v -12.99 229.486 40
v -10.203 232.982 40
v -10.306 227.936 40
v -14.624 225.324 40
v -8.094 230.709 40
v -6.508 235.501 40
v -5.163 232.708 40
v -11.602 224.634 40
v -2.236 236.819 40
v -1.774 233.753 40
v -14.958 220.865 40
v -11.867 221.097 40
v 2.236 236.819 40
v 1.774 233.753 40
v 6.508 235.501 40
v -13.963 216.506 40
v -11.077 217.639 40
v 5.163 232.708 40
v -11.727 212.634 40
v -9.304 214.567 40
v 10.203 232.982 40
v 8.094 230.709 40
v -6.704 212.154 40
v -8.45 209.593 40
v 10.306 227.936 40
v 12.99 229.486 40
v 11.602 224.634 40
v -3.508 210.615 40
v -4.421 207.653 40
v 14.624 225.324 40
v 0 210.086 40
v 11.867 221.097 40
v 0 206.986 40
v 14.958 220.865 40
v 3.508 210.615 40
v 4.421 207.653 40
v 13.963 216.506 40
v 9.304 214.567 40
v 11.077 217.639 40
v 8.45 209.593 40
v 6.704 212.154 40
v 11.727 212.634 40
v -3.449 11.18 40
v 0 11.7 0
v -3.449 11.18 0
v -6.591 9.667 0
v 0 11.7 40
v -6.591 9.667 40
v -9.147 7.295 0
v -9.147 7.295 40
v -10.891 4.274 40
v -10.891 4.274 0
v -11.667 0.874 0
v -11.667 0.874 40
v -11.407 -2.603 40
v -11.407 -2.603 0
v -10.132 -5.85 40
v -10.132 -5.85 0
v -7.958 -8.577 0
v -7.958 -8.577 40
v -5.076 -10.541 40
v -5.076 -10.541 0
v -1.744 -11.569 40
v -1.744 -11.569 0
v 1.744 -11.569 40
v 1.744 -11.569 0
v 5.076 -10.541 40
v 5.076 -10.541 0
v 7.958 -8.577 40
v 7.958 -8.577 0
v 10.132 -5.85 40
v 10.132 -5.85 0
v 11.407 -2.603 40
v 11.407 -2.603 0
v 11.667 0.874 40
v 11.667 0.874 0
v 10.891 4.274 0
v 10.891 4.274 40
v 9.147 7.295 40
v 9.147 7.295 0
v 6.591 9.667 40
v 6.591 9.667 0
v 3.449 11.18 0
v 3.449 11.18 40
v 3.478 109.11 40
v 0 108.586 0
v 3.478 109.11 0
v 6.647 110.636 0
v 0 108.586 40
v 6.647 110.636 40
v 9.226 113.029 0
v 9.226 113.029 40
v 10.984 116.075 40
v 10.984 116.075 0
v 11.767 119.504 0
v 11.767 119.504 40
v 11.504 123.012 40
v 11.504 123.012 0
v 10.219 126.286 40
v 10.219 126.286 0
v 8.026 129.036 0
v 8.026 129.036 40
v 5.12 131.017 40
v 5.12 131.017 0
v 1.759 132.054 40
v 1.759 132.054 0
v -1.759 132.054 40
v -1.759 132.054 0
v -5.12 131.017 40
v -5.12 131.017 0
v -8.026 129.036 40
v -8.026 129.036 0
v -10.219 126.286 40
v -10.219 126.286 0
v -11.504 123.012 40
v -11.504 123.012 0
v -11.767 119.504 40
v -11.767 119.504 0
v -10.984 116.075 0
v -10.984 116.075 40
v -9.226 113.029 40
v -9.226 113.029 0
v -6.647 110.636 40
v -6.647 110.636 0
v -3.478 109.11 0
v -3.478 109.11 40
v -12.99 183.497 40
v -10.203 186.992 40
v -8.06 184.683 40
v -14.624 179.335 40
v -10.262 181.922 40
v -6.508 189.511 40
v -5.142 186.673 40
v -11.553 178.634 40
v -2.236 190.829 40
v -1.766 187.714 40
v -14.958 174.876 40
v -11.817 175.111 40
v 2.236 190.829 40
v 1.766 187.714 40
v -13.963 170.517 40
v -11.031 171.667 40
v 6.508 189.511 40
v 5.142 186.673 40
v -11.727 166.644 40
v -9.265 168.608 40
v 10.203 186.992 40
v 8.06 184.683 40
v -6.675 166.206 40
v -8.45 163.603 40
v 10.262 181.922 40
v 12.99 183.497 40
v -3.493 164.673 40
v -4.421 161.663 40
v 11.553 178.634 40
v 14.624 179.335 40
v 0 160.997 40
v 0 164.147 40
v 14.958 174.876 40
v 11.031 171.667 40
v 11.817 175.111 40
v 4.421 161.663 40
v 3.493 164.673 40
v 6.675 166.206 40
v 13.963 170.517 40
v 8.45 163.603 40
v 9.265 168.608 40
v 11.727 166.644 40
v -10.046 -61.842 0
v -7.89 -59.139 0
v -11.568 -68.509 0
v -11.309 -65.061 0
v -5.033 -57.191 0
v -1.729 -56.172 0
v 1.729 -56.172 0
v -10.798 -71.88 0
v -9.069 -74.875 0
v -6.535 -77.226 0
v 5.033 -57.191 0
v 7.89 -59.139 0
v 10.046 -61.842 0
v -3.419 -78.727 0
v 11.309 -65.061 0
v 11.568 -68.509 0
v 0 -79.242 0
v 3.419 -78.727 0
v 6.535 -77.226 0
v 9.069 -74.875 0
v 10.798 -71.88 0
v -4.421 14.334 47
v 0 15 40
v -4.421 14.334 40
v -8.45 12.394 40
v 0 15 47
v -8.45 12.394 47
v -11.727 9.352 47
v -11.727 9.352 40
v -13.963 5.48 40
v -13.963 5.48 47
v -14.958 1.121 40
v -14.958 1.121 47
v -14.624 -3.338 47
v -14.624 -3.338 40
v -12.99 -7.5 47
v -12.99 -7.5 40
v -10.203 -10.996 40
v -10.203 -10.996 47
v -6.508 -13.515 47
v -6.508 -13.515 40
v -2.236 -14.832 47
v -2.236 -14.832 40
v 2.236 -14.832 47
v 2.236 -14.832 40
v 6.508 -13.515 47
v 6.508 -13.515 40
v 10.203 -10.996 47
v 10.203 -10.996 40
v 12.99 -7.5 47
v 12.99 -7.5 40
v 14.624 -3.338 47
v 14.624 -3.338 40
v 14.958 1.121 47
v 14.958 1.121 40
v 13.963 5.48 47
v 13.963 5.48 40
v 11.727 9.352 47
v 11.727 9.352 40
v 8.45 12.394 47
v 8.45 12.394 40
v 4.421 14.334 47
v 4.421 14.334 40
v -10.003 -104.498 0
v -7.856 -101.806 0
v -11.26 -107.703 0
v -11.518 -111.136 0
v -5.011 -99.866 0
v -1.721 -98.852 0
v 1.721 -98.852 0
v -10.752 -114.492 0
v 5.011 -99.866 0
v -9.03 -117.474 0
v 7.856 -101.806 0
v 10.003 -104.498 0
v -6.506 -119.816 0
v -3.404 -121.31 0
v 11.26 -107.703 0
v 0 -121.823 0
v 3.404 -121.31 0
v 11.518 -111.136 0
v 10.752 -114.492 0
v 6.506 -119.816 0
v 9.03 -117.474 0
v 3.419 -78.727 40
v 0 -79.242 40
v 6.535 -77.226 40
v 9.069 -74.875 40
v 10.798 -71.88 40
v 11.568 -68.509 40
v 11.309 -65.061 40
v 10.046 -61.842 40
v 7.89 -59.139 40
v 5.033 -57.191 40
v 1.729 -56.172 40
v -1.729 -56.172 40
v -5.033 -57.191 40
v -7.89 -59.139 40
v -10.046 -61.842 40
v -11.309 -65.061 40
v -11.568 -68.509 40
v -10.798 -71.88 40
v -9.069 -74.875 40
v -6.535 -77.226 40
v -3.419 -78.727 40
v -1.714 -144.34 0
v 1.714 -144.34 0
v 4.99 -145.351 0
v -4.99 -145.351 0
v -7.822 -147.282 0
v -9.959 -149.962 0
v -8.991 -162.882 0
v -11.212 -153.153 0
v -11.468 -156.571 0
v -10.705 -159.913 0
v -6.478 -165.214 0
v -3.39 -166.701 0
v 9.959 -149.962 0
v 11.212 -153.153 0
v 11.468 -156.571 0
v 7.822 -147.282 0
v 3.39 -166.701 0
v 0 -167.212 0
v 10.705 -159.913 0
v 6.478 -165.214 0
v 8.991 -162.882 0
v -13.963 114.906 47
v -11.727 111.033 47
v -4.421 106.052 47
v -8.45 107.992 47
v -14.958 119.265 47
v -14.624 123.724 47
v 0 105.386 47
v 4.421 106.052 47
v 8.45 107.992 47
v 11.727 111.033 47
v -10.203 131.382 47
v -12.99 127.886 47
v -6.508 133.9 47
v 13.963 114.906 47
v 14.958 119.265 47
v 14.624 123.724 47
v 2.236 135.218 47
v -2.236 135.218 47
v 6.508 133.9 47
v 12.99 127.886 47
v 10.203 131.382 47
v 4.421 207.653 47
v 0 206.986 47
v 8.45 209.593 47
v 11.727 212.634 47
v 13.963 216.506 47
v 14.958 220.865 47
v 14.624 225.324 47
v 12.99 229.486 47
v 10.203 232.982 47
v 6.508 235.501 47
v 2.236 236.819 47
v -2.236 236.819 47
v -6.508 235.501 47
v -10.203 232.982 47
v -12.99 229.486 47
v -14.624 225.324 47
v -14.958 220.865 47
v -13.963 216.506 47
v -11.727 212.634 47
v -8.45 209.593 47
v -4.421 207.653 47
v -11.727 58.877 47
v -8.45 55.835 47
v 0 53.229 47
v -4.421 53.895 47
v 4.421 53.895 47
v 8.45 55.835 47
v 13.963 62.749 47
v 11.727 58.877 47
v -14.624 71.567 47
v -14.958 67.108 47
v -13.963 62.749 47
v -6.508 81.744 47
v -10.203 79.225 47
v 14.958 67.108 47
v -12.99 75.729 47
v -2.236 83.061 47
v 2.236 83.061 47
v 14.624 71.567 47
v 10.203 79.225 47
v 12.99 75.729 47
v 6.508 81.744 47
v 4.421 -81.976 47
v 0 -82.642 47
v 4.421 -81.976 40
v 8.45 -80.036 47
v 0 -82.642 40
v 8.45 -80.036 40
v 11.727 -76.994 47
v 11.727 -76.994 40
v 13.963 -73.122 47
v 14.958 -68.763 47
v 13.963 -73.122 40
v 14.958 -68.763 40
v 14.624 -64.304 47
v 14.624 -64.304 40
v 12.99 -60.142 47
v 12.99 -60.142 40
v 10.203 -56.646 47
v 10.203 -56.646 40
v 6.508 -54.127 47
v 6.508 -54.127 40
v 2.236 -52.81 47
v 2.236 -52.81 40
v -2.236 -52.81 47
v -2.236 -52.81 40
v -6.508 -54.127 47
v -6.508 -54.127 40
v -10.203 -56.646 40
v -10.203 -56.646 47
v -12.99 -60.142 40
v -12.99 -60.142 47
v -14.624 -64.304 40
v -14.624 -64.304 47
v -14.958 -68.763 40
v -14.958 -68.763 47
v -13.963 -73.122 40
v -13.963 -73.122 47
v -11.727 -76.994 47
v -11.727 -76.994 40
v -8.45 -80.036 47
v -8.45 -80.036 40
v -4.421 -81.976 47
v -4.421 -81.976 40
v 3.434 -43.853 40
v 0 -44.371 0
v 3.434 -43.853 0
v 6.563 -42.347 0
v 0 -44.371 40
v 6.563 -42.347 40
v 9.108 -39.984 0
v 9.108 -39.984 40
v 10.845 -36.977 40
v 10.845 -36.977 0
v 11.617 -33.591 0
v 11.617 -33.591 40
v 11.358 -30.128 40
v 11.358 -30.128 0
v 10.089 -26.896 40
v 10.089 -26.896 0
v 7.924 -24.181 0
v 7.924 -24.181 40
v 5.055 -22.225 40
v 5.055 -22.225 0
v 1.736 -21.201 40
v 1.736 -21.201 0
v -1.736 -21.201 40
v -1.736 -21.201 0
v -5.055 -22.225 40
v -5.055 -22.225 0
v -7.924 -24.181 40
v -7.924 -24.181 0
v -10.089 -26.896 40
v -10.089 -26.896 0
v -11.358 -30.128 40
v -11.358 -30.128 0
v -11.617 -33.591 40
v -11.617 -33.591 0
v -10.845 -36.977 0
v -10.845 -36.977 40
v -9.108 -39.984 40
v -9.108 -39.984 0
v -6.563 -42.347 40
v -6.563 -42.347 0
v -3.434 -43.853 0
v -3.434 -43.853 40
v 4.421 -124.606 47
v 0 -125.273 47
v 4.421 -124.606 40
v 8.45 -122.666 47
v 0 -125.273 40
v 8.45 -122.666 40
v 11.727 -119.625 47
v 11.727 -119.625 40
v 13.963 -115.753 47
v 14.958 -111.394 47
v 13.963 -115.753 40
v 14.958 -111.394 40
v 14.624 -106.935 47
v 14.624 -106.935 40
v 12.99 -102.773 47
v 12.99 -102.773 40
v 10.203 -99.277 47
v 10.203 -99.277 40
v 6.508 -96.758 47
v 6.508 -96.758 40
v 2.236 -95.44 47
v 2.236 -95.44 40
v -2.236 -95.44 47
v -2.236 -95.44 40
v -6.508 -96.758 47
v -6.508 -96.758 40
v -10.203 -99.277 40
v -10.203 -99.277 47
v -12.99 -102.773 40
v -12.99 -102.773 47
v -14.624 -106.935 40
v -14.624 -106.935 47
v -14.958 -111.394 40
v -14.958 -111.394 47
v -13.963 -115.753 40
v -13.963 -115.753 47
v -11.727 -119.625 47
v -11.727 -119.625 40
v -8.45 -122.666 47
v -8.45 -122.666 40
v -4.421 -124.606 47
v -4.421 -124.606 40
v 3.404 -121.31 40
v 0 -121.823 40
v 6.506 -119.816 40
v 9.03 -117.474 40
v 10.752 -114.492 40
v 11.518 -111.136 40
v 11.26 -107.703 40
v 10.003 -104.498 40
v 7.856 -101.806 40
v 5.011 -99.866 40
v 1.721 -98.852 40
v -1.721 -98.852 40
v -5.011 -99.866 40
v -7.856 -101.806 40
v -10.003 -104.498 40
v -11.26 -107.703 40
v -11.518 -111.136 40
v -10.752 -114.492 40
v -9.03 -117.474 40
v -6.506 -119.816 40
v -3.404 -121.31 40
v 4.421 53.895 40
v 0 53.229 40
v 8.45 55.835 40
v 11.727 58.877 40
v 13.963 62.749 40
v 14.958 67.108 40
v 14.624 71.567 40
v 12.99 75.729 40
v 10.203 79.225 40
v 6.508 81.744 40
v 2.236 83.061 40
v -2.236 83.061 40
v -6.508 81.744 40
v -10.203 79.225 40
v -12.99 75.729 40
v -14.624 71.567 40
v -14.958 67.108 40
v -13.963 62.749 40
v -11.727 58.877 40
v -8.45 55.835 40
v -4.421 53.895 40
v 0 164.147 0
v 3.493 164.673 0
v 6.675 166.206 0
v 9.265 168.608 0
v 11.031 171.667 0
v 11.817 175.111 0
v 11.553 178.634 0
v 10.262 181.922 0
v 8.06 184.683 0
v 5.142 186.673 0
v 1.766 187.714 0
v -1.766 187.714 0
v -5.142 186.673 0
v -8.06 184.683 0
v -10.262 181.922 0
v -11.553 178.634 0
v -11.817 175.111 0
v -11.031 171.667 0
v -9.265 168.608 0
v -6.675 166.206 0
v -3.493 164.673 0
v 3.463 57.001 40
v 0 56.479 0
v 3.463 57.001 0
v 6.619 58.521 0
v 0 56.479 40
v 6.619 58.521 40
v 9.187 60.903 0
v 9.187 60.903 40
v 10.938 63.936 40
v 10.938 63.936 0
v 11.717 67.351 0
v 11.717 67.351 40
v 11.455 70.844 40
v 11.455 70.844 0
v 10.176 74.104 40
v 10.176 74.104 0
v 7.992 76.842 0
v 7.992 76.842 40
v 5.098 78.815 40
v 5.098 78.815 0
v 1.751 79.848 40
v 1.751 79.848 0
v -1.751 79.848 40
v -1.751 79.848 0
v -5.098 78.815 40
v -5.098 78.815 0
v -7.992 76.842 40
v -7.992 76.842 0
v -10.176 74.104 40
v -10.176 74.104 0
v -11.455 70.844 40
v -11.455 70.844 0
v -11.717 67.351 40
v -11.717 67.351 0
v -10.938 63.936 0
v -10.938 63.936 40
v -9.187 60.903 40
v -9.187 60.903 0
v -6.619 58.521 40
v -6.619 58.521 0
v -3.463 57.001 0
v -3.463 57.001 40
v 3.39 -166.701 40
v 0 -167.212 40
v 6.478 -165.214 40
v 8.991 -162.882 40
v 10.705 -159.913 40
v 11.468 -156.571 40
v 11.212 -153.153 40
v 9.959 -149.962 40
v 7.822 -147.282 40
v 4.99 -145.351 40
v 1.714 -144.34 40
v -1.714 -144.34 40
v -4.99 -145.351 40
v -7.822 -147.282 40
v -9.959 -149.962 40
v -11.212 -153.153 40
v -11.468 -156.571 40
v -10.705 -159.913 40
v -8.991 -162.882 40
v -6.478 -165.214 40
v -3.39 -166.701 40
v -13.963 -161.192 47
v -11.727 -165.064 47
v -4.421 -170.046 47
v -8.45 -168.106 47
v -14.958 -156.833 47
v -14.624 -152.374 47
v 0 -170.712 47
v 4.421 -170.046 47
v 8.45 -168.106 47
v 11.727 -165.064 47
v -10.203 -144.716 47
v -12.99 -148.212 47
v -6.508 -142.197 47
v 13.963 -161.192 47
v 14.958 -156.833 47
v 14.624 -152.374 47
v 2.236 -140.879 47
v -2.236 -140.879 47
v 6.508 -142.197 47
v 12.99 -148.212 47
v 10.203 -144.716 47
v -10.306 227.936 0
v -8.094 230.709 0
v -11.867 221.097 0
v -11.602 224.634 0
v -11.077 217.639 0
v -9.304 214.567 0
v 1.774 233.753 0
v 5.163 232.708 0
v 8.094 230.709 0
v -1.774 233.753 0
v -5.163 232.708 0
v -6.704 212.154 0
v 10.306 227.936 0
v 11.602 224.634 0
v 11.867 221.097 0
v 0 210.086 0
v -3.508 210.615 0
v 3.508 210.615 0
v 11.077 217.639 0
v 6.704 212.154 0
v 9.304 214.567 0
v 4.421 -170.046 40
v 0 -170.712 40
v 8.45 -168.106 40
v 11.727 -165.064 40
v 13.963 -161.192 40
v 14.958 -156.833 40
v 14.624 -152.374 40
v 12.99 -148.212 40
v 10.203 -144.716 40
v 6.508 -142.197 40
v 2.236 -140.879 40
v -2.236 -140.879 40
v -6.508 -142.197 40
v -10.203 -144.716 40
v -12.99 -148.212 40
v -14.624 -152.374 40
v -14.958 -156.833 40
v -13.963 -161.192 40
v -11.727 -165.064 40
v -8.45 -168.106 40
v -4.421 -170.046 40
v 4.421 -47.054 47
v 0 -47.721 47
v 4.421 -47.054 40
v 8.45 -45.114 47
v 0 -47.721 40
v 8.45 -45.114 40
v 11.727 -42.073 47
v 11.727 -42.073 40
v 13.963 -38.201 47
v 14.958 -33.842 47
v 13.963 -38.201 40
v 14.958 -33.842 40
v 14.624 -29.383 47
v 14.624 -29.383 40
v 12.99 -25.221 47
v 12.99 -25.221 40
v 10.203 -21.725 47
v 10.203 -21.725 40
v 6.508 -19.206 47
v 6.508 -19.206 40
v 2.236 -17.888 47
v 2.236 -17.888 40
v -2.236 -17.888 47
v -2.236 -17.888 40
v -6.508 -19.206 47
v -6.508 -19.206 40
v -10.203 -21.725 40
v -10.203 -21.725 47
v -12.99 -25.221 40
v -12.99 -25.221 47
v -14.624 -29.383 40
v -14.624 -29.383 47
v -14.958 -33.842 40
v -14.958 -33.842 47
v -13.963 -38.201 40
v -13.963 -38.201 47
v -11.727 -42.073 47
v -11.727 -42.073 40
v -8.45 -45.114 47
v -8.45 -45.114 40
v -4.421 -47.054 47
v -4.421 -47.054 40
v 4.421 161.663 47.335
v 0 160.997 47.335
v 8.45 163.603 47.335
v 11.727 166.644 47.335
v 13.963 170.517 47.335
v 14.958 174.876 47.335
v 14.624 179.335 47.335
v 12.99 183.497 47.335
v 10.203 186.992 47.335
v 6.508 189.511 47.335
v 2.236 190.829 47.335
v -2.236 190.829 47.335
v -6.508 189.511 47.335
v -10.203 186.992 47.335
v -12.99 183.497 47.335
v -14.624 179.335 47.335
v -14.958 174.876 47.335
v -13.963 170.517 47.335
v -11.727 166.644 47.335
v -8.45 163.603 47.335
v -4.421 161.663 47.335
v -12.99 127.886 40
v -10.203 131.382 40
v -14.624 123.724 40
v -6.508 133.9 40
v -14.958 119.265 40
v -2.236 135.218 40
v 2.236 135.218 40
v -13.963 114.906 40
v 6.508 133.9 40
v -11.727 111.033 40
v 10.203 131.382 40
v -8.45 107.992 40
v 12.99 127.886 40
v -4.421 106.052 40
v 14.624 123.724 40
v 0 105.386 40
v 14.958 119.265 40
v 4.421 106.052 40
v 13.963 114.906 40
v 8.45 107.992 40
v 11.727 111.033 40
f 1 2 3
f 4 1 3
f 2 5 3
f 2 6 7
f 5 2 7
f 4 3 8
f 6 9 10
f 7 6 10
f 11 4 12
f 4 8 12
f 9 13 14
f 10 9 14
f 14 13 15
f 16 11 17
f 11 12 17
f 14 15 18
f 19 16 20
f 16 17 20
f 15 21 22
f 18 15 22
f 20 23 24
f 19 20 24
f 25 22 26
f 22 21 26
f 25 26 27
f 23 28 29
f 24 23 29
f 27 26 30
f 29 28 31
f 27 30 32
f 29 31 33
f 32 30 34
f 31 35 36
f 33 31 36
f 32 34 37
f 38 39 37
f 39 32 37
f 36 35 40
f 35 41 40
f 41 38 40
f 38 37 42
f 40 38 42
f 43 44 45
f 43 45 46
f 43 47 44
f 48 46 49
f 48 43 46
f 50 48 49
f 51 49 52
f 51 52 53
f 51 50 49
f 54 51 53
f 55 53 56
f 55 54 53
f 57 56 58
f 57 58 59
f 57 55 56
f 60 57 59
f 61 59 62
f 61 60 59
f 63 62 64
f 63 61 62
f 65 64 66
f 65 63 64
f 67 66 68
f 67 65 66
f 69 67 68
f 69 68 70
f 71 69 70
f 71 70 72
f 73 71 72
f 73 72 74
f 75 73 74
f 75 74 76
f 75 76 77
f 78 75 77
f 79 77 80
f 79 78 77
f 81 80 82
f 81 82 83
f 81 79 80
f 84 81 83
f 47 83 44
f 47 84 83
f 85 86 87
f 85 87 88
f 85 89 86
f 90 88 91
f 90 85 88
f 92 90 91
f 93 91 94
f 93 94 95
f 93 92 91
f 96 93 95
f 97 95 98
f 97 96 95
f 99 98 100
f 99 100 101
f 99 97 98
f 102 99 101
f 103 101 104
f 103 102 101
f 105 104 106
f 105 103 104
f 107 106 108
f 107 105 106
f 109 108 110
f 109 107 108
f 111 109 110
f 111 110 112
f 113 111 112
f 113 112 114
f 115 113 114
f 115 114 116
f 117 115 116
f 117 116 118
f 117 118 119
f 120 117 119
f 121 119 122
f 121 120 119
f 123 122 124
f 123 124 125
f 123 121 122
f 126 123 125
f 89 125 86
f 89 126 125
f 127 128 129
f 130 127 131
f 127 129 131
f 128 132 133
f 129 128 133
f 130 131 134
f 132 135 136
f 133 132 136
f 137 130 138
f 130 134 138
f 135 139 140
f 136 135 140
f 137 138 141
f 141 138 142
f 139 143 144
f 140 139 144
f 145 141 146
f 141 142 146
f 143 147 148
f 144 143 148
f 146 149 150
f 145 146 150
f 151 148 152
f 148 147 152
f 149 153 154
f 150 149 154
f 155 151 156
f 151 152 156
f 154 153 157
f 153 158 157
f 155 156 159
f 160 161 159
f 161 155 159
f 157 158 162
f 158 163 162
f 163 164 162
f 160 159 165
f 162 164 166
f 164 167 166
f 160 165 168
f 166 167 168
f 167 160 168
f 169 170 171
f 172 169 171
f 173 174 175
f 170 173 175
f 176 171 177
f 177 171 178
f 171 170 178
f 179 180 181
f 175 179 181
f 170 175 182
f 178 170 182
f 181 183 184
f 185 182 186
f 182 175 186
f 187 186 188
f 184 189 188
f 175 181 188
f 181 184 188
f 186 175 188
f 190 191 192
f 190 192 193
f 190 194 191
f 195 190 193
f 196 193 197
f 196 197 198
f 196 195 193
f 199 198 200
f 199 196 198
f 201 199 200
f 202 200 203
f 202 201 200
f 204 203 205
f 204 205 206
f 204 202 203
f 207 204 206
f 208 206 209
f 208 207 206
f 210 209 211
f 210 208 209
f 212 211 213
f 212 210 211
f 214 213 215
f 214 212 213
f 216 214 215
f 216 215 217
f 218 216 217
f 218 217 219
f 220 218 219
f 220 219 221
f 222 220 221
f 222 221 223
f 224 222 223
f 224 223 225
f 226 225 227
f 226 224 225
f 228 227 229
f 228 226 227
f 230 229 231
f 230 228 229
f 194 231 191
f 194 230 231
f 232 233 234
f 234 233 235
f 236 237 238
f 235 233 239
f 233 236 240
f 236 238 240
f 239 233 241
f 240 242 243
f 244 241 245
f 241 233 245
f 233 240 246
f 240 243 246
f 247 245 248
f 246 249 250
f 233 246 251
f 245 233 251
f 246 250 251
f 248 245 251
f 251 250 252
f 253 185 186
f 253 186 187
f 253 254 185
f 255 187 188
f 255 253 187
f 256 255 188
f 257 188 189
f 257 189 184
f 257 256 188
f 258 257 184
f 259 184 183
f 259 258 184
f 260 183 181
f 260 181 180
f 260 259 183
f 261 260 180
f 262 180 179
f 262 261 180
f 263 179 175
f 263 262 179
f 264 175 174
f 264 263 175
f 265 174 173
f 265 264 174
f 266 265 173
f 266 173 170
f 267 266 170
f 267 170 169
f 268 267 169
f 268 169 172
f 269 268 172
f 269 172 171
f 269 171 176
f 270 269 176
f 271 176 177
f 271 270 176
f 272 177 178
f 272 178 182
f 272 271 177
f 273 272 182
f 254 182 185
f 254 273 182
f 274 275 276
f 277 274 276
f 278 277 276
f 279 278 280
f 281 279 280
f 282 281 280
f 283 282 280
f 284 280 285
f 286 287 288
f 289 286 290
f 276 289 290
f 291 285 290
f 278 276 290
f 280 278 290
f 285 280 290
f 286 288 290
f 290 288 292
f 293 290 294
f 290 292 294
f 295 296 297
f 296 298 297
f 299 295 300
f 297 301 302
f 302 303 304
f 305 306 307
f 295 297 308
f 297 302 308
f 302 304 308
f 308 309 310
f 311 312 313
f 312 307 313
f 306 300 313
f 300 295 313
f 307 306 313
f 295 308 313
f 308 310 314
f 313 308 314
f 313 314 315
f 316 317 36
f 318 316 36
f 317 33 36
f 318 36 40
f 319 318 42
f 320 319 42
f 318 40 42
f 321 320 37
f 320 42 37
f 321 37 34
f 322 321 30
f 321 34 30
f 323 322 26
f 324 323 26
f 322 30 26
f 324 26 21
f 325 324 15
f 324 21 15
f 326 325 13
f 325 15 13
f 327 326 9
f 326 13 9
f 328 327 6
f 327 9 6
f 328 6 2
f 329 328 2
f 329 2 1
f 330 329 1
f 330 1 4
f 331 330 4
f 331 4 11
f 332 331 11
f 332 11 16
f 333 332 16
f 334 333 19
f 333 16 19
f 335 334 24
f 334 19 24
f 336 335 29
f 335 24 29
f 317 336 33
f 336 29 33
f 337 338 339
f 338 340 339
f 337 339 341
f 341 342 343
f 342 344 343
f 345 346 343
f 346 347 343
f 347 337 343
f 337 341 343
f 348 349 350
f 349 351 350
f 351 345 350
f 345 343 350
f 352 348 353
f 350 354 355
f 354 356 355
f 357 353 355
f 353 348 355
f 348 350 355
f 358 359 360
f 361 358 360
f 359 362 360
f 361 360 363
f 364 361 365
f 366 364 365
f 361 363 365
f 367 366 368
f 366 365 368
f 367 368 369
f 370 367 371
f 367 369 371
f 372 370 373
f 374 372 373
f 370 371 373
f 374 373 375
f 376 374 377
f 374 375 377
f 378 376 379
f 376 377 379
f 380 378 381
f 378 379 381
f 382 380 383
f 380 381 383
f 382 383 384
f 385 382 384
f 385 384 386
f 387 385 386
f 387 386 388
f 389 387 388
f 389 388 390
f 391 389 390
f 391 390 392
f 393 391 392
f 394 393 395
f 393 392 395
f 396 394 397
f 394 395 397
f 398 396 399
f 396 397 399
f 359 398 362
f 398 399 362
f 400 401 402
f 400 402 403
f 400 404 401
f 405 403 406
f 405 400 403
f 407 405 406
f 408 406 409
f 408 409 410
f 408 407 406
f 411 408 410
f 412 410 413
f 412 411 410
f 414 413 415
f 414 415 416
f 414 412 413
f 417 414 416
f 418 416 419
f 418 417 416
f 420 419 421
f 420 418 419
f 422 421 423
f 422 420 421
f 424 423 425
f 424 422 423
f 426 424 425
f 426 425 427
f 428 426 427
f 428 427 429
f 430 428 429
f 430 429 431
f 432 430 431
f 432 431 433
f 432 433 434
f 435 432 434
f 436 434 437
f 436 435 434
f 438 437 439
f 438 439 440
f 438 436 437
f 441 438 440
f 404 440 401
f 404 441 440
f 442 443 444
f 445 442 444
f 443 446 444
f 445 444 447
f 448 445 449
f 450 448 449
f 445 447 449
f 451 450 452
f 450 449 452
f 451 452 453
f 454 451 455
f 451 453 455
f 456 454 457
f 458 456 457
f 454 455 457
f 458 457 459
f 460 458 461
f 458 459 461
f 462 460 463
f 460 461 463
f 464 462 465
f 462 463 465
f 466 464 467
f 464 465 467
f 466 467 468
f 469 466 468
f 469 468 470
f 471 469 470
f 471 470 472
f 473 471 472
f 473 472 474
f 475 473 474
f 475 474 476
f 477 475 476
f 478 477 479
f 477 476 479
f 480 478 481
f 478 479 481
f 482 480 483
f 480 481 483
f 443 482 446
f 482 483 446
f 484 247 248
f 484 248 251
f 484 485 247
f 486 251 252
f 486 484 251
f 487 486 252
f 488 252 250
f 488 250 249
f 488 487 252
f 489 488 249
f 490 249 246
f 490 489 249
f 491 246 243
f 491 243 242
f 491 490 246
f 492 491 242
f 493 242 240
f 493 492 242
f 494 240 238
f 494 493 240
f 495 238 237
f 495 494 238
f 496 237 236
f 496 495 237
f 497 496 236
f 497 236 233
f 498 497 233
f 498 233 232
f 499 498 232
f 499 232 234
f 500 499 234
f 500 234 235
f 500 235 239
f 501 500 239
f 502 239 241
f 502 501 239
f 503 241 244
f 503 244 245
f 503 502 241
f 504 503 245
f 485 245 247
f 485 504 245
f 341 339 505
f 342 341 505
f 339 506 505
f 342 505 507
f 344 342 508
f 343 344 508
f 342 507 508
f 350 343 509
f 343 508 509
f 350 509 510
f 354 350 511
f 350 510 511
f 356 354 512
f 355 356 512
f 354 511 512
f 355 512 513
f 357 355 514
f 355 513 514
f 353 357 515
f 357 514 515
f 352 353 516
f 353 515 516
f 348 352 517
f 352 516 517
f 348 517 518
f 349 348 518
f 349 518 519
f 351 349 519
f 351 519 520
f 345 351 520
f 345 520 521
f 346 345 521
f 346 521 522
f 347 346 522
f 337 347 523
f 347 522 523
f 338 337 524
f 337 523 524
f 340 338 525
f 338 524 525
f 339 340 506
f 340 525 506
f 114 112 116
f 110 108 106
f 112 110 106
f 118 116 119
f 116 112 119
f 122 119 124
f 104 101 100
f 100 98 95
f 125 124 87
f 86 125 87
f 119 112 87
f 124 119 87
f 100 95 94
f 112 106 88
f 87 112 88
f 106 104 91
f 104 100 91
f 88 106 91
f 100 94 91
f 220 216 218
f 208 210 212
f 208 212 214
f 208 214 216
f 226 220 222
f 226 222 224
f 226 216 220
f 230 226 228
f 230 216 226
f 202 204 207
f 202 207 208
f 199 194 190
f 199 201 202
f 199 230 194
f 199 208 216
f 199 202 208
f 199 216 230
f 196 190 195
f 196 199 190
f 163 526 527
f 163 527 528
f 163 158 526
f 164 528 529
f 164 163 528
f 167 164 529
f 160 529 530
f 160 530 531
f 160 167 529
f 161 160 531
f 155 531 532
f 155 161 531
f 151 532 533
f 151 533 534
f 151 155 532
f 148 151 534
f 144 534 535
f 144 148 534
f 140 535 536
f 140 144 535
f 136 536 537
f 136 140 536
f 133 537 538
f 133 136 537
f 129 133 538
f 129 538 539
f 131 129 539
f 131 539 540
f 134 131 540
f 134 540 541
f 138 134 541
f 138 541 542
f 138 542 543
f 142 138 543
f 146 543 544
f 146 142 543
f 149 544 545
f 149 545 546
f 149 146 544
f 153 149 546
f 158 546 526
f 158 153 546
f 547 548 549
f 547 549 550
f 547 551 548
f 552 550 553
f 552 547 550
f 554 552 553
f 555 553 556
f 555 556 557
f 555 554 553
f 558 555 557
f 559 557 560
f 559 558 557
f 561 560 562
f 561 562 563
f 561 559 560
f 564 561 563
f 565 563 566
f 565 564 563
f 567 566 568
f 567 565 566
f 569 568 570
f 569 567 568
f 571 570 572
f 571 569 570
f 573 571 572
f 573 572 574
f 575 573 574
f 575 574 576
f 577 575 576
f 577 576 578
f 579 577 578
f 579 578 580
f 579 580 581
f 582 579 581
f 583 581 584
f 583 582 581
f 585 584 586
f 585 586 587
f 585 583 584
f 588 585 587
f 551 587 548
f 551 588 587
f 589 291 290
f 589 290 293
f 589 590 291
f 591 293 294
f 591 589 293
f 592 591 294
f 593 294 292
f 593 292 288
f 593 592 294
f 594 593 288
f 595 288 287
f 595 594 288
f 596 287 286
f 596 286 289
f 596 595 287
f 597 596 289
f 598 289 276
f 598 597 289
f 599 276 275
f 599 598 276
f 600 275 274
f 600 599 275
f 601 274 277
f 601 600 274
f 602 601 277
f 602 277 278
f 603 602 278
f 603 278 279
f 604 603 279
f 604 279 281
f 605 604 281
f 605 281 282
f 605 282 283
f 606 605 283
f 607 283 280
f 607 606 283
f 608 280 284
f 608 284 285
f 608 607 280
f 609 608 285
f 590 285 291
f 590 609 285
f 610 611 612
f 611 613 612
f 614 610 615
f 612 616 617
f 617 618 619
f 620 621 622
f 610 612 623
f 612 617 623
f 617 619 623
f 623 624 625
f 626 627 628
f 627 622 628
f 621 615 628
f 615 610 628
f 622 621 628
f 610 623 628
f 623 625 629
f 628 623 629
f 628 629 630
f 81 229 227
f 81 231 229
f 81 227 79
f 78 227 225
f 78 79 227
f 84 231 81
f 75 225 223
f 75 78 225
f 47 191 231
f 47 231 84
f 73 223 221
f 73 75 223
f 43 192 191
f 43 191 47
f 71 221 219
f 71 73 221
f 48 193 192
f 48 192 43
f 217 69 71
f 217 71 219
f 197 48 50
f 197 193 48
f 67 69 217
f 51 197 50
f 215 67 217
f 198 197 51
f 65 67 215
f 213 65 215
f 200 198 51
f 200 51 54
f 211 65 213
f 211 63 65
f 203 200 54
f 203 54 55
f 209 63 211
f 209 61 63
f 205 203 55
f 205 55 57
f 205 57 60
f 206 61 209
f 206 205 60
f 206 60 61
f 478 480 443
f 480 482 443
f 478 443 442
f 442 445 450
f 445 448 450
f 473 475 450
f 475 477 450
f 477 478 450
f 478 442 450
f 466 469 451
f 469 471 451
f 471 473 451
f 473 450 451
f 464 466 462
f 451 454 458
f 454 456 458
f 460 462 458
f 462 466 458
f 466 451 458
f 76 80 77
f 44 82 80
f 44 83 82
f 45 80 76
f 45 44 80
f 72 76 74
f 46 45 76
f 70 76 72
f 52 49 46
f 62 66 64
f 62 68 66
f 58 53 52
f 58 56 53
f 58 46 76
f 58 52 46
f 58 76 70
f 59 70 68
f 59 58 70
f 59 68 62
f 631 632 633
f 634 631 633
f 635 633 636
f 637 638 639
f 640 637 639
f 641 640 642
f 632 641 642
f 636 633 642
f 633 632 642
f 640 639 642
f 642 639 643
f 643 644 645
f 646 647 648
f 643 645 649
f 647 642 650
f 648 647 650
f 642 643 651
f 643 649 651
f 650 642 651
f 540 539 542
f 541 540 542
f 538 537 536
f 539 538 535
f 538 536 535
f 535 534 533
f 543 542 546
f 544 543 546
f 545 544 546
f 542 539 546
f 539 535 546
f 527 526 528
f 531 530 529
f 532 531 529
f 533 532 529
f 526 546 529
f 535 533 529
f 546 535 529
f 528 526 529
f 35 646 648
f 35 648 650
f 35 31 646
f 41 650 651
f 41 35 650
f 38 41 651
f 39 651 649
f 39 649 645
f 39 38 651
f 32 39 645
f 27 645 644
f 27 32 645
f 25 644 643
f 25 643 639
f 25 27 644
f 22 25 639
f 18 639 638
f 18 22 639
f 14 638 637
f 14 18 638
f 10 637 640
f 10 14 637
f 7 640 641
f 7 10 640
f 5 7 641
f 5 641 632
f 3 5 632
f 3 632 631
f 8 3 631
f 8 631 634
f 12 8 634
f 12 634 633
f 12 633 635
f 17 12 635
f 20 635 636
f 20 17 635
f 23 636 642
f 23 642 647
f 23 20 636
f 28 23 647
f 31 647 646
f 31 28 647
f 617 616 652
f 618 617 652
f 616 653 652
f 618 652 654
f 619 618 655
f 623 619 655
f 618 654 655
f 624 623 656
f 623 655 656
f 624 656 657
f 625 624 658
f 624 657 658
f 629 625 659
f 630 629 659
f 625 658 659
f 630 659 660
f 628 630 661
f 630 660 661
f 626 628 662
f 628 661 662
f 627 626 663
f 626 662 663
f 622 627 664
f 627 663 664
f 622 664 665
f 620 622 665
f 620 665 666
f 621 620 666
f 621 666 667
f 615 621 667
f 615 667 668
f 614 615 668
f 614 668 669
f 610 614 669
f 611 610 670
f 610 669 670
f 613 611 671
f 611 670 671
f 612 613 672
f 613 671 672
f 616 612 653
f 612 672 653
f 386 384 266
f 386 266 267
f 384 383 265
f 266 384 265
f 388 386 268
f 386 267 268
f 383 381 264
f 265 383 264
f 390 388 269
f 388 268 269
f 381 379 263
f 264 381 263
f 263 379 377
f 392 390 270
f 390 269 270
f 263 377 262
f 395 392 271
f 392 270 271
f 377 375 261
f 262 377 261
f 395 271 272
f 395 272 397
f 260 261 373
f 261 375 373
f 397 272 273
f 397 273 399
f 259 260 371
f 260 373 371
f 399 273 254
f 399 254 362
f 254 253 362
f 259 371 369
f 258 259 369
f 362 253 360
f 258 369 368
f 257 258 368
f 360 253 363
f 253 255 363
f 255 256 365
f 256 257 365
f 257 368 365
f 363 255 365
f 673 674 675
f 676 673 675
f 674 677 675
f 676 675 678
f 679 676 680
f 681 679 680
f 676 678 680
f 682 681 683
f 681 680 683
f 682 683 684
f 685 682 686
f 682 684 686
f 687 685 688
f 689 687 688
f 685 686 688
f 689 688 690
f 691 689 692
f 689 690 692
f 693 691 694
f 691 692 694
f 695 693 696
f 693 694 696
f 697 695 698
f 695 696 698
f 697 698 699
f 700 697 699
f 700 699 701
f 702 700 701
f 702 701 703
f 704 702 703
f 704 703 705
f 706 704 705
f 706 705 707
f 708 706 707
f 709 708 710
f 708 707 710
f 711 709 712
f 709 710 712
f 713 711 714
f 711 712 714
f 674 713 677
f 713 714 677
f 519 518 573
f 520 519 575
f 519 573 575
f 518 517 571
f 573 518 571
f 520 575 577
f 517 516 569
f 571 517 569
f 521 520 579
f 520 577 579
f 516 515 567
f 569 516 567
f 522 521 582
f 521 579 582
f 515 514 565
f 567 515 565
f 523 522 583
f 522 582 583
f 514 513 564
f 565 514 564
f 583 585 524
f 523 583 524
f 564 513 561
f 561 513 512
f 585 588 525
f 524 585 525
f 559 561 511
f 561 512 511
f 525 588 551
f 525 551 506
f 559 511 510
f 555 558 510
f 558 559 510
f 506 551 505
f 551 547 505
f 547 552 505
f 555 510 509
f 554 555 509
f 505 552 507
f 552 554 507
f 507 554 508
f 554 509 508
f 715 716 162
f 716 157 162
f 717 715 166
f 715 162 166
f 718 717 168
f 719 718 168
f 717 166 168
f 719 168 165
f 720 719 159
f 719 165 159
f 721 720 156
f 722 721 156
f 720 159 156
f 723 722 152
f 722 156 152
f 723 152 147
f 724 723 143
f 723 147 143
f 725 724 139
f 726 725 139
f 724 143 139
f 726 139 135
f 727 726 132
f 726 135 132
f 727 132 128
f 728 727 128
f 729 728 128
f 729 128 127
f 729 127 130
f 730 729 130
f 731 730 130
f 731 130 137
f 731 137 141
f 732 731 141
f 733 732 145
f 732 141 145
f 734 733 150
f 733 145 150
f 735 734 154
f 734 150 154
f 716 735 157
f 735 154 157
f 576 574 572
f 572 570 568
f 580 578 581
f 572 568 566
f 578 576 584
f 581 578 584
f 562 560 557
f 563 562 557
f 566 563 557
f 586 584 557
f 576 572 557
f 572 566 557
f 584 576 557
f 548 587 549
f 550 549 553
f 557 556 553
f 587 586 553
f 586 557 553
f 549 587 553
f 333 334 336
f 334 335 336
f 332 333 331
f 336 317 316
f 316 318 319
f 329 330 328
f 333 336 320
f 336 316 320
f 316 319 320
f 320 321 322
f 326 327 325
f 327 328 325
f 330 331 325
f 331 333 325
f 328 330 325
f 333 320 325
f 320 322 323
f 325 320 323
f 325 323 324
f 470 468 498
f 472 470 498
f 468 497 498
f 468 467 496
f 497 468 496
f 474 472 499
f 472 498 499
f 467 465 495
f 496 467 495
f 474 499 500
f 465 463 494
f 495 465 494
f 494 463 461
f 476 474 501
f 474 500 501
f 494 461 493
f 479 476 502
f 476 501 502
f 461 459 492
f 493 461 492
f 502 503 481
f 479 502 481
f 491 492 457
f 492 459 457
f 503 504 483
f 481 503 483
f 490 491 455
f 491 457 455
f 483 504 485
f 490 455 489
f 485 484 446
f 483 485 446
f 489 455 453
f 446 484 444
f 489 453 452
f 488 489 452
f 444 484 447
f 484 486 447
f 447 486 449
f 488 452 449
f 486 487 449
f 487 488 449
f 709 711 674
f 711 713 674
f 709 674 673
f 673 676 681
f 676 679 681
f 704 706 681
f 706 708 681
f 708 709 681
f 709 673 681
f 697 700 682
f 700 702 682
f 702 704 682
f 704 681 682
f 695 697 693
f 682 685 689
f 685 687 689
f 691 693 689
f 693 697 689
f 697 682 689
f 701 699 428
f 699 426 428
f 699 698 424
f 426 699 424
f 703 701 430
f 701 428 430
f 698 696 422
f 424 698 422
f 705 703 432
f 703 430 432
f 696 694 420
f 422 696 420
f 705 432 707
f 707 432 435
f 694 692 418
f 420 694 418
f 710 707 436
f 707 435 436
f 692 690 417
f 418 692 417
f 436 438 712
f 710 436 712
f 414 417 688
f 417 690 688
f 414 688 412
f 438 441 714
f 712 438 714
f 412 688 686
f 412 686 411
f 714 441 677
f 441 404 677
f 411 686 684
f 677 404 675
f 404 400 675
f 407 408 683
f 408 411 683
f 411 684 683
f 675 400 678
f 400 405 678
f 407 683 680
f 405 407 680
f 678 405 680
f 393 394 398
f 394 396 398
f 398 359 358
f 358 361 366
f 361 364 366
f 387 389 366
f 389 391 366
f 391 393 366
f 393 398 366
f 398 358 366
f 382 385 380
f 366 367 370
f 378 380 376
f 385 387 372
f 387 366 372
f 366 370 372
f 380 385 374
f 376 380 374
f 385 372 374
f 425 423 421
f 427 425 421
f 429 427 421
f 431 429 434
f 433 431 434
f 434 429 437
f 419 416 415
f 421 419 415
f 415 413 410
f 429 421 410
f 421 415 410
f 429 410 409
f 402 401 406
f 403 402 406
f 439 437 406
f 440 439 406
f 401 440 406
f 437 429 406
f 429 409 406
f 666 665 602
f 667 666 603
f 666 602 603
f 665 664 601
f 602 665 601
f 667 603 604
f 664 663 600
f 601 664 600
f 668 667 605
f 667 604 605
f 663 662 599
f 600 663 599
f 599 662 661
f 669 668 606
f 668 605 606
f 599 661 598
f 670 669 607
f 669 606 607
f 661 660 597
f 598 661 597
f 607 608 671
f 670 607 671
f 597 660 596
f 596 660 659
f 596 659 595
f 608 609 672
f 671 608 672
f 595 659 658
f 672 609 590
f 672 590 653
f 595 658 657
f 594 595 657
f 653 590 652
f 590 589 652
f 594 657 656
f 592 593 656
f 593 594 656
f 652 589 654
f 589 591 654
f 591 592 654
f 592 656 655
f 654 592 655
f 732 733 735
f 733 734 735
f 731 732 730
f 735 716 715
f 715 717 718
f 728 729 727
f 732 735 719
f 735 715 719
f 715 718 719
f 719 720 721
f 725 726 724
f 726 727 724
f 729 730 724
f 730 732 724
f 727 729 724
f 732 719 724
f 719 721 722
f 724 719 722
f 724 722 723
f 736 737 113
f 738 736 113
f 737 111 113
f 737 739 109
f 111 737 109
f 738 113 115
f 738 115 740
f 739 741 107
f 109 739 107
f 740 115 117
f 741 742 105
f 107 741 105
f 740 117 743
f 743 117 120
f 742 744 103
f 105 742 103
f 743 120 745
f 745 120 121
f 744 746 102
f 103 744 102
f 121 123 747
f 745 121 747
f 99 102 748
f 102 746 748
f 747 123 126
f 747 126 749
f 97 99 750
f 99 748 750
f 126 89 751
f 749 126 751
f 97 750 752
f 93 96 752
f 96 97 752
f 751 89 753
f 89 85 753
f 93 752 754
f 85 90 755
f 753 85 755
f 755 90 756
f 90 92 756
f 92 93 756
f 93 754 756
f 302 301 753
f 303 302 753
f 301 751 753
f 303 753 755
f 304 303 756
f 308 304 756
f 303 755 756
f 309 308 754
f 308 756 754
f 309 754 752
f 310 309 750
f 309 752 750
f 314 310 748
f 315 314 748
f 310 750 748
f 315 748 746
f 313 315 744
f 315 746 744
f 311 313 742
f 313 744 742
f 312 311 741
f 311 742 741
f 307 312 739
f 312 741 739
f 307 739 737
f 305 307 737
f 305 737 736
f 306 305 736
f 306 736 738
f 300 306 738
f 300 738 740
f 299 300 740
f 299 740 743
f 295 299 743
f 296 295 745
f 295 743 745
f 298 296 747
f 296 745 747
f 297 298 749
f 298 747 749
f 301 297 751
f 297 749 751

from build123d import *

# Parameters (mm, degrees)
F0_W    = 11.7
F0_H    = 7
F0_W_2  = 3.3
F0_H_2  = 40
F0_W_3  = 11.9
F0_W_4  = 11.85
F0_W_5  = 11.8
F0_W_6  = 11.75
F0_W_7  = 11.65
F0_W_8  = 11.6
F0_W_9  = 11.55
F0_W_10 = 11.5


with BuildPart() as f1:
    # F0 (on Right) → F1 (revolve)
    with BuildSketch(Plane.YZ):
        with Locations((5.85, 43.5)):
            Rectangle(F0_W, F0_H)
        with Locations((13.35, 43.5)):
            Rectangle(F0_W_2, F0_H)
        with Locations((5.85, 20)):
            Rectangle(F0_W, F0_H_2)
    revolve(axis=Axis((0, 0, 23.5), (0, 0, 1)))


with BuildPart() as f2:
    # F0 (on Right) → F2 (revolve)
    with BuildSketch(Plane.YZ):
        with Locations((216.0361596823, 20)):
            Rectangle(F0_W_3, F0_H_2)
        Polygon((210.0861596823, 40), (221.9861596823, 40), (221.9861596823, 47), (206.9861596823, 47), (206.9861596823, 40), align=None)
    revolve(axis=Axis((0, 221.9861596823, 20), (0, 0, 1)))


with BuildPart() as f3:
    # F0 (on Right) → F3 (revolve)
    with BuildSketch(Plane.YZ):
        with Locations((170.0716909885, 20)):
            Rectangle(F0_W_4, F0_H_2)
        Polygon((160.9966909885, 40), (164.1466909885, 40), (175.9966909885, 40), (175.9966909885, 47.3348134756), (160.9966909885, 47.3348134756), align=None)
    revolve(axis=Axis((0, 175.9966909885, 20), (0, 0, 1)))


with BuildPart() as f4:
    # F0 (on Right) → F4 (revolve)
    with BuildSketch(Plane.YZ):
        with Locations((114.4857660294, 20)):
            Rectangle(F0_W_5, F0_H_2)
        Polygon((108.5857660294, 40), (120.3857660294, 40), (120.3857660294, 47), (105.3857660294, 47), (105.3857660294, 40), align=None)
    revolve(axis=Axis((0, 120.3857660294, 20), (0, 0, 1)))


with BuildPart() as f5:
    # F0 (on Right) → F5 (revolve)
    with BuildSketch(Plane.YZ):
        Polygon((56.4790121913, 40), (68.2290121913, 40), (68.2290121913, 47), (53.2290121913, 47), (53.2290121913, 40), align=None)
        with Locations((62.3540121913, 20)):
            Rectangle(F0_W_6, F0_H_2)
    revolve(axis=Axis((0, 68.2290121913, 20), (0, 0, 1)))


with BuildPart() as f6:
    # F0 (on Right) → F6 (revolve)
    with BuildSketch(Plane.YZ):
        with Locations((-38.5458188832, 20)):
            Rectangle(F0_W_7, F0_H_2)
        Polygon((-44.3708188832, 40), (-32.7208188832, 40), (-32.7208188832, 47), (-47.7208188832, 47), (-47.7208188832, 40), align=None)
    revolve(axis=Axis((0, -32.7208188832, 20), (0, 0, 1)))


with BuildPart() as f7:
    # F0 (on Right) → F7 (revolve)
    with BuildSketch(Plane.YZ):
        Polygon((-79.2420208454, 40), (-67.6420208454, 40), (-67.6420208454, 47), (-82.6420208454, 47), (-82.6420208454, 40), align=None)
        with Locations((-73.4420208454, 20)):
            Rectangle(F0_W_8, F0_H_2)
    revolve(axis=Axis((0, -67.6420208454, 20), (0, 0, 1)))


with BuildPart() as f8:
    # F0 (on Right) → F8 (revolve)
    with BuildSketch(Plane.YZ):
        with Locations((-116.0476477504, 20)):
            Rectangle(F0_W_9, F0_H_2)
        Polygon((-121.8226477504, 40), (-110.2726477504, 40), (-110.2726477504, 47), (-125.2726477504, 47), (-125.2726477504, 40), align=None)
    revolve(axis=Axis((0, -110.2726477504, 20), (0, 0, 1)))


with BuildPart() as f9:
    # F0 (on Right) → F9 (revolve)
    with BuildSketch(Plane.YZ):
        Polygon((-167.211920023, 40), (-155.711920023, 40), (-155.711920023, 47), (-170.711920023, 47), (-170.711920023, 40), align=None)
        with Locations((-161.461920023, 20)):
            Rectangle(F0_W_10, F0_H_2)
    revolve(axis=Axis((0, -155.711920023, 20), (0, 0, 1)))


solid = Compound([f1.part, f2.part, f3.part, f4.part, f5.part, f6.part, f7.part, f8.part, f9.part])
